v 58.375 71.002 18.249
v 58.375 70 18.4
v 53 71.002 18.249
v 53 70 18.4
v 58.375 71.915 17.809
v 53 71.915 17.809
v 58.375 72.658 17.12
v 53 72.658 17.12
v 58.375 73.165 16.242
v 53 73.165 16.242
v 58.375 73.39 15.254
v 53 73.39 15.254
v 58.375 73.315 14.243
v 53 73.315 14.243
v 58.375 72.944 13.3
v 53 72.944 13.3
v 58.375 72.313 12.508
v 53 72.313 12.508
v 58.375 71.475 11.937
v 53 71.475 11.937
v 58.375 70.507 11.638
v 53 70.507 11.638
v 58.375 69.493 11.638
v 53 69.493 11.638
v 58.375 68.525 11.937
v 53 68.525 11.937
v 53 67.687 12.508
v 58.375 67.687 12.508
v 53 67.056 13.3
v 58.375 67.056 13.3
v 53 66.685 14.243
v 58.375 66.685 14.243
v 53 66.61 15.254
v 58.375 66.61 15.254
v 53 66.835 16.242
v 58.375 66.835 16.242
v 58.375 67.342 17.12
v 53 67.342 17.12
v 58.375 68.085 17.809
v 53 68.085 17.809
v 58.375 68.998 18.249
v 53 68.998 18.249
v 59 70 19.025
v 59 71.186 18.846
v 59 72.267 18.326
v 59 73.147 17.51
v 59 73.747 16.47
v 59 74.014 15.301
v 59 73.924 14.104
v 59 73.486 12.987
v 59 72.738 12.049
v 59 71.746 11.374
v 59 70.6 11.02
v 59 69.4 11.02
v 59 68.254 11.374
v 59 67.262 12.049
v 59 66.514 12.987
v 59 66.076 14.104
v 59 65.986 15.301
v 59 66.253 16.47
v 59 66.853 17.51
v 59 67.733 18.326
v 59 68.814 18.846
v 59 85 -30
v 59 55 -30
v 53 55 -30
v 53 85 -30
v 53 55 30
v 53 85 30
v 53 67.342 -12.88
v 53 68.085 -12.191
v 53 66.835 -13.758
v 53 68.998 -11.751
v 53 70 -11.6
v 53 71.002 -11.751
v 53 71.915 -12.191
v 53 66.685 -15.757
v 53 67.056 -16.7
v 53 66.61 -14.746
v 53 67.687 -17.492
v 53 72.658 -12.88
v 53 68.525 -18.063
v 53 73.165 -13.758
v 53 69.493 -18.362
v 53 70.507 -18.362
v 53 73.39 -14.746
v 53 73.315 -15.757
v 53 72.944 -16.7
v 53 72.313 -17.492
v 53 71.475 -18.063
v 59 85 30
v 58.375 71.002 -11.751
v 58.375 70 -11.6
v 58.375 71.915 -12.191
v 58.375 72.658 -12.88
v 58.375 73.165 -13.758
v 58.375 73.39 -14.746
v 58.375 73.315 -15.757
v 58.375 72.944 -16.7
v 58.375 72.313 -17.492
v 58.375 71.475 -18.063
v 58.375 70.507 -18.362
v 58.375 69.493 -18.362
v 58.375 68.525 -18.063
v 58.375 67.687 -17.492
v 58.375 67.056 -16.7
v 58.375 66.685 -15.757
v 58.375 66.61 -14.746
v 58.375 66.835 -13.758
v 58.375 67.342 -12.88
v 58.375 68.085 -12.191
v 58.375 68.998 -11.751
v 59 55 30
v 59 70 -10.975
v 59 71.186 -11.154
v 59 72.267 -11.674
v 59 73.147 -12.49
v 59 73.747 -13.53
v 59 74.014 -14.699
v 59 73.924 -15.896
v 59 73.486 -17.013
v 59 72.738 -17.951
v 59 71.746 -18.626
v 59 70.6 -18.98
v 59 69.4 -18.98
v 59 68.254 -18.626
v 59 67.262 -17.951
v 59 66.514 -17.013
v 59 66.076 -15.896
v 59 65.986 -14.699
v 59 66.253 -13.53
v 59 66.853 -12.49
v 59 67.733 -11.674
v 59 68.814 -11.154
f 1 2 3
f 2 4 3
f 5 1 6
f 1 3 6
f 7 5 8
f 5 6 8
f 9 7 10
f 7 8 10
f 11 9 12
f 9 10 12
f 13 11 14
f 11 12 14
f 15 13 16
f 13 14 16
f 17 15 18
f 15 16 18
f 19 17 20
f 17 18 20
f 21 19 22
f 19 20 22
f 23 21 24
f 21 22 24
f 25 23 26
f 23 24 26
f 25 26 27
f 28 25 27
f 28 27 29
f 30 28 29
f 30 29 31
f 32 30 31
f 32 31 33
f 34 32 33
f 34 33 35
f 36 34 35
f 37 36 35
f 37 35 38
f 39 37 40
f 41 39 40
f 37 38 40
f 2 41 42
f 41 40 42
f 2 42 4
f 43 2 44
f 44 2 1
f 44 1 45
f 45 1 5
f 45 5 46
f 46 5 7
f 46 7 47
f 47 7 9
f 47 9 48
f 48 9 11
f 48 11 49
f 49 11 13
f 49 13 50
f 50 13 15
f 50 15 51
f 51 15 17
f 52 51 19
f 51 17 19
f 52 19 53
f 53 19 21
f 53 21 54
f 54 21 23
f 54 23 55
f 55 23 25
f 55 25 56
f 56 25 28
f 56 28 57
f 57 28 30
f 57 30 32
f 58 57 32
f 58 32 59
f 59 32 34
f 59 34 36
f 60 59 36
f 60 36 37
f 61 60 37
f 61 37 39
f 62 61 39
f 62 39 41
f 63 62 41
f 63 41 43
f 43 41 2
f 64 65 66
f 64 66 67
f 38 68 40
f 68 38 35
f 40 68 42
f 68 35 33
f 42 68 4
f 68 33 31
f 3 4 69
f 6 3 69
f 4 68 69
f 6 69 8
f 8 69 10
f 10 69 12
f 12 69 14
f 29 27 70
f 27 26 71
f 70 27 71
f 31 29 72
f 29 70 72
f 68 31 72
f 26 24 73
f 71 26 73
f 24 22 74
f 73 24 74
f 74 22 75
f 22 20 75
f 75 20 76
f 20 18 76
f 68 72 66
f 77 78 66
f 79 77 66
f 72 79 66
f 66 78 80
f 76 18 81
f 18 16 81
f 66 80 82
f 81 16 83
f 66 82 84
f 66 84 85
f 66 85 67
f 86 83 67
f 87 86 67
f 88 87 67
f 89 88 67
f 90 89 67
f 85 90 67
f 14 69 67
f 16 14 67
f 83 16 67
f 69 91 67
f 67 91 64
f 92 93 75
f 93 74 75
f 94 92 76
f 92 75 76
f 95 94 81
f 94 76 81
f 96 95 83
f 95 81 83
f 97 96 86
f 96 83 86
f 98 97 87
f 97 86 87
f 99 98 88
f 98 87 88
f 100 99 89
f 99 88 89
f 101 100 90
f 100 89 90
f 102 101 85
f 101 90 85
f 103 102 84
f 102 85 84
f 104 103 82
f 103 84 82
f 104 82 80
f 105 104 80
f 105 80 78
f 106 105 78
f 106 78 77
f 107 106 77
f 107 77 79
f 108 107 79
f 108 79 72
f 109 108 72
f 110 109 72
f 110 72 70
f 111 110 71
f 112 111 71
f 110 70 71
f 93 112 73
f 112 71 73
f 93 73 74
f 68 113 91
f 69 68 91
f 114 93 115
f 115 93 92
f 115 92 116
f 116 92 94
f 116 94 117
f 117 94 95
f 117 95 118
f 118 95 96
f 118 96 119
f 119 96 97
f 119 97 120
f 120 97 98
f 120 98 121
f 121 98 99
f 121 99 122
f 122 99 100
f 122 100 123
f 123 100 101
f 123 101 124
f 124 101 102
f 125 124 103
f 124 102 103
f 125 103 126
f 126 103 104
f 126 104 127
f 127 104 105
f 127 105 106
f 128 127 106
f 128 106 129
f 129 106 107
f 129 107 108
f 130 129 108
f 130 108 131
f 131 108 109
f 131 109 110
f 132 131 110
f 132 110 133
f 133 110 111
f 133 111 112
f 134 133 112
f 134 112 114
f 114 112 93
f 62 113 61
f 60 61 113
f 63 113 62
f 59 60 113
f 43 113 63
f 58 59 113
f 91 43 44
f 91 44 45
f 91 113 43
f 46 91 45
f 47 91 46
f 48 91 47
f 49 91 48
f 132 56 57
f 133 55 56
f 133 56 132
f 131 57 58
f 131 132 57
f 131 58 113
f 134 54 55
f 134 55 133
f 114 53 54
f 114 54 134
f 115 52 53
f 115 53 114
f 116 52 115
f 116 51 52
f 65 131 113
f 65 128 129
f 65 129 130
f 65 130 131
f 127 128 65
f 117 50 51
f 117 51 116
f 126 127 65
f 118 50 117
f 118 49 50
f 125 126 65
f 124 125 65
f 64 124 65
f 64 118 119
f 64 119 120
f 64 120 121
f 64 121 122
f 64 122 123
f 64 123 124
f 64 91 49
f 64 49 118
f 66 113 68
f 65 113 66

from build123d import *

# Parameters (mm, degrees)
SKETCH_3_W                  = 60
SKETCH_3_H                  = 30
EXTRUDE_2_DEPTH             = 3
HOLE_WIZARD_M84_D           = 6.8
HOLE_WIZARD_M84_CSINK_D     = 8.05
HOLE_WIZARD_M84_CSINK_ANGLE = 90


with BuildPart() as part:
    # Эскиз3 → Бобышка-Вытянуть2 (new, symmetric)
    with BuildSketch(Plane(origin=(56, 0, 0), x_dir=(0, 0, -1), z_dir=(1, 0, 0))):
        with Locations((0, 70)):
            Rectangle(SKETCH_3_W, SKETCH_3_H)
    extrude(amount=EXTRUDE_2_DEPTH, both=True)

    # Отверстие обработанное метчиком M84 (through all)
    with Locations(Plane(origin=(59, 0, 0), x_dir=(0, 0, -1), z_dir=(1, 0, 0))):
        with Locations((-15, 70), (15, 70)):
            CounterSinkHole(HOLE_WIZARD_M84_D / 2, HOLE_WIZARD_M84_CSINK_D / 2, counter_sink_angle=HOLE_WIZARD_M84_CSINK_ANGLE)


solid = part.part
